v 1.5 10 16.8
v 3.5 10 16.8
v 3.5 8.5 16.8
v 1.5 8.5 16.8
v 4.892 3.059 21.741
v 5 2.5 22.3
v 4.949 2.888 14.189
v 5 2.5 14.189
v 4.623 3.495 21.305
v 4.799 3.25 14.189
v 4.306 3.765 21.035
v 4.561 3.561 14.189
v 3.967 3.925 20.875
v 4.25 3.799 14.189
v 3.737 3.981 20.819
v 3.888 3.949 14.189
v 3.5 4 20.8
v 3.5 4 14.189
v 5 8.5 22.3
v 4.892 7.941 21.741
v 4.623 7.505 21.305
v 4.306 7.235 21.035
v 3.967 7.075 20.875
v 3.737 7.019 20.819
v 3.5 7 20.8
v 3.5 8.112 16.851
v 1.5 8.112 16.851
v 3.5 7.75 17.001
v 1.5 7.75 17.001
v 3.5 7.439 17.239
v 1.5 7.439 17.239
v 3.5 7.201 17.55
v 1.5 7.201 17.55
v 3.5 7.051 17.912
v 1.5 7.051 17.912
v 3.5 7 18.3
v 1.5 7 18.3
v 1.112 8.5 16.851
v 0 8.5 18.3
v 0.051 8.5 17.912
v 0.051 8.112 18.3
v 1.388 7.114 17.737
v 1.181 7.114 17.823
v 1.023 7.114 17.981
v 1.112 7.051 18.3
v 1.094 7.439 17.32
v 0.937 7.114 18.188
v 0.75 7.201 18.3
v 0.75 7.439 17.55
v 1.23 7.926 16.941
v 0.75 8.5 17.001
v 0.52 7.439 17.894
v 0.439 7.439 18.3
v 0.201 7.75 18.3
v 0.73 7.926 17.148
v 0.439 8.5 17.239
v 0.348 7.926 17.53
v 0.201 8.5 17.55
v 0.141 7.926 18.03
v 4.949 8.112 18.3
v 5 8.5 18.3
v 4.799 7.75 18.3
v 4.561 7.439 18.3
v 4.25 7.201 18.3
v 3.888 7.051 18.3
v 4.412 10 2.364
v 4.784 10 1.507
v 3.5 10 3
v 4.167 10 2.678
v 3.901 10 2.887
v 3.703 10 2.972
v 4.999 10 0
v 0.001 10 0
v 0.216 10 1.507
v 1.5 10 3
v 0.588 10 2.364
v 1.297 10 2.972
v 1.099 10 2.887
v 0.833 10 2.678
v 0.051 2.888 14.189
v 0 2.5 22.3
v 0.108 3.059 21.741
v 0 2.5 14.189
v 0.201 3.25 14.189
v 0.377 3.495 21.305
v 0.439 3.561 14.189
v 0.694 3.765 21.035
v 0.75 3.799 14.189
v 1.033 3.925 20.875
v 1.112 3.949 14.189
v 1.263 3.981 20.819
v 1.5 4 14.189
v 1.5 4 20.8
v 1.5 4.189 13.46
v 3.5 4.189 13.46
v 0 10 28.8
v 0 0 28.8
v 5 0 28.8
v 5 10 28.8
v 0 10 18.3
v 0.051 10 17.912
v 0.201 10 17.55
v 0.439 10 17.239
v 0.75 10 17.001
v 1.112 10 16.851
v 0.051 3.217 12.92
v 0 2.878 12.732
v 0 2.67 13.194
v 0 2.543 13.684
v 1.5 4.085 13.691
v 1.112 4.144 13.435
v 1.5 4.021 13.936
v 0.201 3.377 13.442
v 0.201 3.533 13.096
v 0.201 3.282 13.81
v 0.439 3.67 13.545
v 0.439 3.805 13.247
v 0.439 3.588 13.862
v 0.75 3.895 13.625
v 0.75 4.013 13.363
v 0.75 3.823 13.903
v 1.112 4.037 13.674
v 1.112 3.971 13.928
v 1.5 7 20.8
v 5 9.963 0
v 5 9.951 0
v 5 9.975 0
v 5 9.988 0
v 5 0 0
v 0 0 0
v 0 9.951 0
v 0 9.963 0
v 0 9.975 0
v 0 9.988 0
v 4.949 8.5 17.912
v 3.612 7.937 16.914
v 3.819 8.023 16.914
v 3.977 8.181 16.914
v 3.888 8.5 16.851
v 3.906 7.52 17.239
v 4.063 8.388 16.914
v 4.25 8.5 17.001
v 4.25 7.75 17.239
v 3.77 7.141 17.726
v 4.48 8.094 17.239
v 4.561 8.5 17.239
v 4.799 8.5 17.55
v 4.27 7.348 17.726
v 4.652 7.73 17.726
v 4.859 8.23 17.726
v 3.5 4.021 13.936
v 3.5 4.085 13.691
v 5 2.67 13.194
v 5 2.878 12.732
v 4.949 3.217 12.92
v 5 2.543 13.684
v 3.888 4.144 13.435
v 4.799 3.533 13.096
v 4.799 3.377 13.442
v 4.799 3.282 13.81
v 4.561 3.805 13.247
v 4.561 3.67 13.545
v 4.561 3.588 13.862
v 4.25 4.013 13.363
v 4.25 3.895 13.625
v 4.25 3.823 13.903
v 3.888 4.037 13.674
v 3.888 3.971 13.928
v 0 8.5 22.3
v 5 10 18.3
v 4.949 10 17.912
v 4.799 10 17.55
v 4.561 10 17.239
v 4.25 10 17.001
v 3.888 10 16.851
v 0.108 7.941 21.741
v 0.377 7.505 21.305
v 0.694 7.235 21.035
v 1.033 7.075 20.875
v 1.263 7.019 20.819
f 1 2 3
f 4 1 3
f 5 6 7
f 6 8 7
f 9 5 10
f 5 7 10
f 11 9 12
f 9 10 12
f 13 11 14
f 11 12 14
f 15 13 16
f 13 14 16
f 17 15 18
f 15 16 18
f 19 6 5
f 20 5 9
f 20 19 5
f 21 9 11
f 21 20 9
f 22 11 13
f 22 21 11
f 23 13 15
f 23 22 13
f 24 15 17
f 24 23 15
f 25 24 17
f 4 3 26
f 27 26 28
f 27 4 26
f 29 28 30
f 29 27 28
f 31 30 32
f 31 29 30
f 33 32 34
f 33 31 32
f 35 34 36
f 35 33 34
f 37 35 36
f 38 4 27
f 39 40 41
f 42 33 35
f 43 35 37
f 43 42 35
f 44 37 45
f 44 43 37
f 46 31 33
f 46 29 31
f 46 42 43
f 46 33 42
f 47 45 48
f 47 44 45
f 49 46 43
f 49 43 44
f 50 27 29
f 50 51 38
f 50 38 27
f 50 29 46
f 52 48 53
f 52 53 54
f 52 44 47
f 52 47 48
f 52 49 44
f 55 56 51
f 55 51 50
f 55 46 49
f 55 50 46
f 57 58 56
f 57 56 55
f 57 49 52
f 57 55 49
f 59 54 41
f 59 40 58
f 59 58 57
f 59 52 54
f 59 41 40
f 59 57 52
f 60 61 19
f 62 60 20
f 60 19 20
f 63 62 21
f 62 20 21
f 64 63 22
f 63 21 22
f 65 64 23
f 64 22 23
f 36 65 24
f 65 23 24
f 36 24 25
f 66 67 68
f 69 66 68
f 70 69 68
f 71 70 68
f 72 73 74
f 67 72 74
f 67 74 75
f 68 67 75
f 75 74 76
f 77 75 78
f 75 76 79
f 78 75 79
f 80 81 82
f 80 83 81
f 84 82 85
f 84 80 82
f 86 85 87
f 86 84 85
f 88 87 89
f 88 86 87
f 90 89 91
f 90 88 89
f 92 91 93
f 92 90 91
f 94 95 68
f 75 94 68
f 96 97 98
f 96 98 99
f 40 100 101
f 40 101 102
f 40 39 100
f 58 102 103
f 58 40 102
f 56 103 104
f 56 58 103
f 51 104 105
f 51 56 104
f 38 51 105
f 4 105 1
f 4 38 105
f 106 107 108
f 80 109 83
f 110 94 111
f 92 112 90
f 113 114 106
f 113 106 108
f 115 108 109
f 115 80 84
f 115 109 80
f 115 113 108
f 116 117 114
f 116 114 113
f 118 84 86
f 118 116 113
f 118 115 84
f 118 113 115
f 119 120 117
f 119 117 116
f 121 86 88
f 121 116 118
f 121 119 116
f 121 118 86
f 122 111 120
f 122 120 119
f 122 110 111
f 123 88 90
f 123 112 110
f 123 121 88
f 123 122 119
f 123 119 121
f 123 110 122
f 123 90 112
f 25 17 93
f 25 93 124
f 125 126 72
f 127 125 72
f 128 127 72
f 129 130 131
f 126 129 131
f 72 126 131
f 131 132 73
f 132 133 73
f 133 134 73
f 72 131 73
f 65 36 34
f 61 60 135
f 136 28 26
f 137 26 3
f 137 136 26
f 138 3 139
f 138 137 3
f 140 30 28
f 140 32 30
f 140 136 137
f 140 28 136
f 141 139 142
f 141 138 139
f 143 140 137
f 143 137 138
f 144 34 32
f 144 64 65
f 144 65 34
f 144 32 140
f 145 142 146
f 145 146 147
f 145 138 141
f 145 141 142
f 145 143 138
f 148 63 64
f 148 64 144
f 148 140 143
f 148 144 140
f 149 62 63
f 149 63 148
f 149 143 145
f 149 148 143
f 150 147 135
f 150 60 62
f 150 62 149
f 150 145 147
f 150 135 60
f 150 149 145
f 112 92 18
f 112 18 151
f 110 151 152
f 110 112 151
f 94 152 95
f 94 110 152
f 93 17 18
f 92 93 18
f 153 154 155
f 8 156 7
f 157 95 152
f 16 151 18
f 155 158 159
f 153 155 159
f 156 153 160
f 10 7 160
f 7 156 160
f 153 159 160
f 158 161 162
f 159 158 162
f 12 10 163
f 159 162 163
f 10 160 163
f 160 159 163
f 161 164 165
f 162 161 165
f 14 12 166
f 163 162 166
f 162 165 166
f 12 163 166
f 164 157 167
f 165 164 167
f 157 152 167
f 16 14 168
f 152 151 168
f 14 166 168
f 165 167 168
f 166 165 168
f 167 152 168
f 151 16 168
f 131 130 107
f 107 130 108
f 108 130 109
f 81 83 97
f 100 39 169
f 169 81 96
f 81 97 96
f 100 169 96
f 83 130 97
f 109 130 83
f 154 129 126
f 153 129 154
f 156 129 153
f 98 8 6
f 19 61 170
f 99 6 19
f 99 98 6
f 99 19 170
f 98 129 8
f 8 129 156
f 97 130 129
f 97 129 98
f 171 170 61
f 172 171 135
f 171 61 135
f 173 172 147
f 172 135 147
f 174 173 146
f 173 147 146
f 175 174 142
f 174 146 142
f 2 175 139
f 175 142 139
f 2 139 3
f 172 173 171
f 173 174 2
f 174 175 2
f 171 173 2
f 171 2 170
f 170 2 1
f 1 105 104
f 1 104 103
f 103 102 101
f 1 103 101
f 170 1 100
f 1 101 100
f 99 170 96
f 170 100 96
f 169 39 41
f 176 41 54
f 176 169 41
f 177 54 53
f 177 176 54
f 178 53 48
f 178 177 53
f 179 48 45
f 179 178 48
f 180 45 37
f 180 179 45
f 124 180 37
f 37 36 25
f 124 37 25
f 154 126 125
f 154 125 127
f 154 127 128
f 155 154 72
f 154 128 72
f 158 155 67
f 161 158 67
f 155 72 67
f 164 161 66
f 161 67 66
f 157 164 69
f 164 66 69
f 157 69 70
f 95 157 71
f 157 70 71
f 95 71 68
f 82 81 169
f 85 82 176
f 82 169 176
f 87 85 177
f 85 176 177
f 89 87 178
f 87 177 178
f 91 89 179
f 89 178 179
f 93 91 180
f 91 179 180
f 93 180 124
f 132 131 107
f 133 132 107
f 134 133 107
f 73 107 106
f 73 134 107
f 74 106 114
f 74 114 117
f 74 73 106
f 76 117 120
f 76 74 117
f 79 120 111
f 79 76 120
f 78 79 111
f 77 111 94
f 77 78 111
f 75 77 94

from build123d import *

# Parameters (mm, degrees)
SKETCH2_W           = 10
SKETCH2_H           = 28.8
BOSS_EXTRUDE1_DEPTH = 5
SKETCH3_W           = 3
SKETCH3_H           = 4
CUT_EXTRUDE1_DEPTH  = 31.894012365
FILLET2_R           = 1.5


with BuildPart() as part:
    # Sketch2 → Boss-Extrude1 (new body)
    with BuildSketch(Plane.YZ):
        with Locations((5, 14.4)):
            Rectangle(SKETCH2_W, SKETCH2_H)
    extrude(amount=BOSS_EXTRUDE1_DEPTH)

    # Sketch3 → Cut-Extrude1 (cut, through all)
    with BuildSketch(Plane.YZ.offset(5)):
        with Locations((5.5, 18.8)):
            Rectangle(SKETCH3_W, SKETCH3_H)
        Polygon((7, 16.8), (4, 16.8), (4, 13.8), (10, 3), (10, 16.8), align=None)
    extrude(amount=-CUT_EXTRUDE1_DEPTH, mode=Mode.SUBTRACT)

    # Fillet2
    fillet2_edges = [part.edges().sort_by_distance(p)[0] for p in [
        (5, 4, 17.3),
        (2.5, 4, 13.8),
        (0, 5.5, 20.8),
        (5, 7, 18.8),
        (0, 8.5, 16.8),
        (2.5, 7, 16.8),
        (0, 7, 8.4),
        (0, 4, 17.3),
        (0, 7, 18.8),
        (5, 7, 8.4),
        (5, 8.5, 16.8),
        (5, 5.5, 20.8),
    ]]
    fillet(fillet2_edges, radius=FILLET2_R)


solid = part.part
